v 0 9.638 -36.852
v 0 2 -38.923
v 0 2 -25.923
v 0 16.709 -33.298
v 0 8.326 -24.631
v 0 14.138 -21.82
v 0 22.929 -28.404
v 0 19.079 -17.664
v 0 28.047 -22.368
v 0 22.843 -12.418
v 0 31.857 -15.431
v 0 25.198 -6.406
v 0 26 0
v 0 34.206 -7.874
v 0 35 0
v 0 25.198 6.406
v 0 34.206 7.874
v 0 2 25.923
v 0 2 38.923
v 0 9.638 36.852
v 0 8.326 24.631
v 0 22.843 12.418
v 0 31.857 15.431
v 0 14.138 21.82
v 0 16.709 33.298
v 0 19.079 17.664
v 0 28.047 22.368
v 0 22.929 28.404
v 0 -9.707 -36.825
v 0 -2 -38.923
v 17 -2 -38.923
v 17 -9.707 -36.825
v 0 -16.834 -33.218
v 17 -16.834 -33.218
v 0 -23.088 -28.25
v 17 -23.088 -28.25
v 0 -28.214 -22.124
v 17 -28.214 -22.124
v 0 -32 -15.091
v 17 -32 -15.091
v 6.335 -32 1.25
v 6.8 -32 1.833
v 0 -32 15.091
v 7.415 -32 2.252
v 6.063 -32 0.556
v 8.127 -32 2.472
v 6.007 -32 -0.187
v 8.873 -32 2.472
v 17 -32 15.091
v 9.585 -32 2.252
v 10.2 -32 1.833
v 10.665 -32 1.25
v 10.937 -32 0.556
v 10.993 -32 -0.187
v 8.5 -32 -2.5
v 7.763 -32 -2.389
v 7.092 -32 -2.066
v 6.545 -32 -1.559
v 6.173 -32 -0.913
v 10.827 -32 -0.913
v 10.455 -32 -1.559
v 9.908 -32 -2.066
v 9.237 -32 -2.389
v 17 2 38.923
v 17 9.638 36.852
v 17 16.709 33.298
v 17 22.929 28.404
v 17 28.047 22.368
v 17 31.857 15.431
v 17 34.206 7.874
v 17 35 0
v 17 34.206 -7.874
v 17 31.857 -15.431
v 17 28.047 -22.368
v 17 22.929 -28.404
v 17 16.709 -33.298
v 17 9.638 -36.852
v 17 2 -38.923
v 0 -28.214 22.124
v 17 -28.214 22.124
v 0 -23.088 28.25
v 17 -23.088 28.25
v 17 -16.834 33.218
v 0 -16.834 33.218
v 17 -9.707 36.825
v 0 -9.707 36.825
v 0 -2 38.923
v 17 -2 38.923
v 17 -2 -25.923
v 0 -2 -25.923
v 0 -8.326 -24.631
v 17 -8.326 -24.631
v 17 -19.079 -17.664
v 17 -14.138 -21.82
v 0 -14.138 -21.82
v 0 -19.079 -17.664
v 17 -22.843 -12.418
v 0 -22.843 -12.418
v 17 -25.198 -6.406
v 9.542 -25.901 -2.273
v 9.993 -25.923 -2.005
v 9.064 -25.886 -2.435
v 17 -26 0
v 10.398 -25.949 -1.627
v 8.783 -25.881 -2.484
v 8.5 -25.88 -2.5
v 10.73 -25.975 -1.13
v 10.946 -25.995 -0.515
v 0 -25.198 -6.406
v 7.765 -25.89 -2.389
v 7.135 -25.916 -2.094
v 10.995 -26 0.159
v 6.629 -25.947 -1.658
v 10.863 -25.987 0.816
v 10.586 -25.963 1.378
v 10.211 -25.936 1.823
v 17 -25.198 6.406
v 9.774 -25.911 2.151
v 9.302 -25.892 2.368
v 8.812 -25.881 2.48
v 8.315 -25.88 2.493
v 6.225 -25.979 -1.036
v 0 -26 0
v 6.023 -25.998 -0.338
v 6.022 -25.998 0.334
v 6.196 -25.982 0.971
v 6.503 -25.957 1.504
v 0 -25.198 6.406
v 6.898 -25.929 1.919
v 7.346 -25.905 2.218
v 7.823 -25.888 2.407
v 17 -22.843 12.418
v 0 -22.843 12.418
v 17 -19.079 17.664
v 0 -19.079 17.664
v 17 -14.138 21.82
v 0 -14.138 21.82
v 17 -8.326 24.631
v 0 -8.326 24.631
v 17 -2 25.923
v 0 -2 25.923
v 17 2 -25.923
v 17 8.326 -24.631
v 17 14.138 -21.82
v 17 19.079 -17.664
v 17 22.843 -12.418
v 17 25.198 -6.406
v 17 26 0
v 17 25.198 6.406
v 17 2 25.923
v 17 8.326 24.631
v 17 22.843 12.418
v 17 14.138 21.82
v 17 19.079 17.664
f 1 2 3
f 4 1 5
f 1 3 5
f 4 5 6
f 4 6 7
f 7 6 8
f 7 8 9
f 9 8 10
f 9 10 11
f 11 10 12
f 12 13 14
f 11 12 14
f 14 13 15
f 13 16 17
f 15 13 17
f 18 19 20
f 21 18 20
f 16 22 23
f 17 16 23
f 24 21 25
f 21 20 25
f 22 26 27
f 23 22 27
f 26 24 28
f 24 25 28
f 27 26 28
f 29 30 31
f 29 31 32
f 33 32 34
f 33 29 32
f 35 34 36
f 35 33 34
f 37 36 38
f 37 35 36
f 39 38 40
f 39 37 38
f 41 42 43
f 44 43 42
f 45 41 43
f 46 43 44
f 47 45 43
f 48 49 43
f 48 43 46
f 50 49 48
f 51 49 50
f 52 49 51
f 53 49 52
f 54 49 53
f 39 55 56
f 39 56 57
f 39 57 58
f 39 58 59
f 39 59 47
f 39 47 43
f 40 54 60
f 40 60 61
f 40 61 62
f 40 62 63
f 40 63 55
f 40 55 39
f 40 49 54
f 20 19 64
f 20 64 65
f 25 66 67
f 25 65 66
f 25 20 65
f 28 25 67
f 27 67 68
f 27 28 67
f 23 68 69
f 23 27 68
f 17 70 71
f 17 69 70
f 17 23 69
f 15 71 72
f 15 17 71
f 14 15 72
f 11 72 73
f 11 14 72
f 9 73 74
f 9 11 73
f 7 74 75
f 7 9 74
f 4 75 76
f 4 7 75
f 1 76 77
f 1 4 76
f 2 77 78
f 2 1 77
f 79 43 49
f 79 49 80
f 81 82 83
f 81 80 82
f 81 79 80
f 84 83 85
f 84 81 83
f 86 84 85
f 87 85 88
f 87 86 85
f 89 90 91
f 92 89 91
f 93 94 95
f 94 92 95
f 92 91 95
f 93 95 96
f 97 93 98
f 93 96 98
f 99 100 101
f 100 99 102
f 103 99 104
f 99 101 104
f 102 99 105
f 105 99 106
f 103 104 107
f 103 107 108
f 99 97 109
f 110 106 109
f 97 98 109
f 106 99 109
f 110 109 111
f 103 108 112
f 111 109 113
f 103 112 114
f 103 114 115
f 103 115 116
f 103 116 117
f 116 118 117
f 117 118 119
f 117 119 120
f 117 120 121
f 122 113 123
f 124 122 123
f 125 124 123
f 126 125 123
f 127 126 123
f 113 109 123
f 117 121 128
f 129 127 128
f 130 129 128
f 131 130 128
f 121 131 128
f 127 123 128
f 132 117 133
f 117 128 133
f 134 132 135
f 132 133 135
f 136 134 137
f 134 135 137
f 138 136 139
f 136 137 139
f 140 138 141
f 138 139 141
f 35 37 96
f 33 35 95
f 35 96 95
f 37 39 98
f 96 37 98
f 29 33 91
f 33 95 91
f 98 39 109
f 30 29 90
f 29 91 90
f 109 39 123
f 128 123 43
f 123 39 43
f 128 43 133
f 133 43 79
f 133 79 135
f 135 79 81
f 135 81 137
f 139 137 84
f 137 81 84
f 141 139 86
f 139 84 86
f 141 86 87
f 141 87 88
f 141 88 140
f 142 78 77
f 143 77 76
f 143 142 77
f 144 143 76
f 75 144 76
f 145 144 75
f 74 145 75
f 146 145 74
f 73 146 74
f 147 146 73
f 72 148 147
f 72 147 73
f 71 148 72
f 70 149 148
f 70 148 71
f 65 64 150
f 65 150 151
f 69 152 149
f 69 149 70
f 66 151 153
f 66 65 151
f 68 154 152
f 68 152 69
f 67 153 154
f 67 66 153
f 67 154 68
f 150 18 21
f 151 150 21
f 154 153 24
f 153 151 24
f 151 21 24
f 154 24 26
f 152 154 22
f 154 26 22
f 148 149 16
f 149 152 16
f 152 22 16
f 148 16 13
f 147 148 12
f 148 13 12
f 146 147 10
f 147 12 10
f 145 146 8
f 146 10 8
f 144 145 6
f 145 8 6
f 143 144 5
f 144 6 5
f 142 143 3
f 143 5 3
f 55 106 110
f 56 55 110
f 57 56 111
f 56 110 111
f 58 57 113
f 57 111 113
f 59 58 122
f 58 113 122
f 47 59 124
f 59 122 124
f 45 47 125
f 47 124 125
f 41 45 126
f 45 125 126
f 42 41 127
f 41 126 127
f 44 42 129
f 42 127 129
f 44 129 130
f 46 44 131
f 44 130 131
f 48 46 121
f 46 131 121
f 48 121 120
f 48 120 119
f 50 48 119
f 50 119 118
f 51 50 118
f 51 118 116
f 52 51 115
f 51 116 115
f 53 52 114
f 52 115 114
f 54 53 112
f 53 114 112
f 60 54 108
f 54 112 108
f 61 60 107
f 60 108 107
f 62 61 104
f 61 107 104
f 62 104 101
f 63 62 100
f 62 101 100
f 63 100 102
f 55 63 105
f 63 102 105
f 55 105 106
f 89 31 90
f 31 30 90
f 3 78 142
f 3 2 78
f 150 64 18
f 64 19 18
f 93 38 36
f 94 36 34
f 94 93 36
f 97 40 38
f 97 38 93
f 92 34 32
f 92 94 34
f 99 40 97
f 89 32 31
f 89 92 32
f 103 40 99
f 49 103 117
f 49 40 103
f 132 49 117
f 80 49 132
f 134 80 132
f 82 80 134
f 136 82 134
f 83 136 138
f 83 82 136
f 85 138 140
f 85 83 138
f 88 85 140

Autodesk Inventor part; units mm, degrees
ref_plane "YZ Plane" through (0, 0, 0) normal (1, 0, 0) x (0, 1, 0)
ref_plane "XZ Plane" through (0, 0, 0) normal (0, 1, 0) x (-1, 0, 0)
ref_plane "XY Plane" through (0, 0, 0) normal (0, 0, 1) x (1, 0, 0)
sketch "Sketch1" plane through (0, 0, 0) normal (1, 0, 0) x (0, 1, 0)
  arc A0 (2, -38.923) -> (2, 38.923) centre (-4.4545, 0) ccw
  line L0 (0, -54.4921) -> (0, 54.4921) construction
  line L1 (2, 38.923) -> (2, 25.923)
  line L2 (2, -38.923) -> (2, -25.923)
  line L3 (-49, 0) -> (49, 0) construction
  arc A1 (2, -25.923) -> (2, 25.923) centre (0, 0) ccw
  arc A2 (-2, 38.923) -> (-2, -38.923) centre (4.4545, 0) ccw
  line L4 (-2, 38.923) -> (-2, 25.923)
  line L5 (-2, -38.923) -> (-2, -25.923)
  arc A3 (-2, 25.923) -> (-2, -25.923) centre (0, 0) ccw
  point P0 (0, 0)
  point P1 (12.8231, 0)
  point P2 (35, 0)
  point P3 (12.8231, 0)
  point P4 (26, 0)
  point P5 (-12.8231, 0)
  point P6 (-35, 0)
  point P7 (-12.8231, 0)
  point P8 (-26, 0)
  dimension "d2" = 13
  dimension "d6" = 26
  dimension "d7" = 9
  dimension "d9" = 33
extrude "Extrusion1" add sketch "Sketch1" along normal blind 17
sketch "Sketch5" plane through (17, 0, 0) normal (1, 0, 0) x (0, 0, -1)
  line L0 (38.923, -2) -> (25.923, -2) construction
  arc A0 (-25.923, -2) -> (25.923, -2) centre (0, 0) ccw construction
  line L1 (-25.923, -2) -> (-38.923, -2) construction
  arc A1 (-38.923, -2) -> (38.923, -2) centre (0, 4.4545) ccw construction
  line L2 (0, -49) -> (0, 49) construction
  arc A2 (-25.923, -2) -> (25.923, -2) centre (0, 0) ccw construction
  line L3 (15.0906, -35) -> (-15.0906, -35)
  line L4 (-15.0906, -35) -> (-15.0906, -32)
  line L5 (-15.0906, -32) -> (15.0906, -32)
  line L6 (15.0906, -32) -> (15.0906, -35)
  arc A3 (-38.923, -2) -> (38.923, -2) centre (0, 4.4545) ccw projected
  point P0 (0, 0)
  point P1 (0, -26)
  dimension "d13" = 6
extrude "Extrusion2" cut sketch "Sketch5" against normal blind 17
sketch "Sketch6" plane through (17, -32, -15.0906) normal (0, -1, 0) x (1, 0, 0)
  line L0 (0, 30.1813) -> (0, 0) construction
  line L1 (-17, 30.1813) -> (0, 30.1813) construction
  line L2 (-17, 0) -> (-17, 30.1813) construction
  line L3 (0, 0) -> (-17, 0) construction
  line L4 (-17, 15.0906) -> (0, 15.0906) construction
  line L5 (0, 41.0136) -> (0, -10.8323) construction
  line L6 (-17, 30.1813) -> (0, 30.1813) construction
  line L7 (-8.5, 30.1813) -> (-8.5, 0) construction
  point P0 (-8.5, 15.0906)
hole "Hole1" at (8.5, -32, 0) direction (0, 1, 0) diameter 5 depth 8 tip angle 118
properties part number "turny_bit"
